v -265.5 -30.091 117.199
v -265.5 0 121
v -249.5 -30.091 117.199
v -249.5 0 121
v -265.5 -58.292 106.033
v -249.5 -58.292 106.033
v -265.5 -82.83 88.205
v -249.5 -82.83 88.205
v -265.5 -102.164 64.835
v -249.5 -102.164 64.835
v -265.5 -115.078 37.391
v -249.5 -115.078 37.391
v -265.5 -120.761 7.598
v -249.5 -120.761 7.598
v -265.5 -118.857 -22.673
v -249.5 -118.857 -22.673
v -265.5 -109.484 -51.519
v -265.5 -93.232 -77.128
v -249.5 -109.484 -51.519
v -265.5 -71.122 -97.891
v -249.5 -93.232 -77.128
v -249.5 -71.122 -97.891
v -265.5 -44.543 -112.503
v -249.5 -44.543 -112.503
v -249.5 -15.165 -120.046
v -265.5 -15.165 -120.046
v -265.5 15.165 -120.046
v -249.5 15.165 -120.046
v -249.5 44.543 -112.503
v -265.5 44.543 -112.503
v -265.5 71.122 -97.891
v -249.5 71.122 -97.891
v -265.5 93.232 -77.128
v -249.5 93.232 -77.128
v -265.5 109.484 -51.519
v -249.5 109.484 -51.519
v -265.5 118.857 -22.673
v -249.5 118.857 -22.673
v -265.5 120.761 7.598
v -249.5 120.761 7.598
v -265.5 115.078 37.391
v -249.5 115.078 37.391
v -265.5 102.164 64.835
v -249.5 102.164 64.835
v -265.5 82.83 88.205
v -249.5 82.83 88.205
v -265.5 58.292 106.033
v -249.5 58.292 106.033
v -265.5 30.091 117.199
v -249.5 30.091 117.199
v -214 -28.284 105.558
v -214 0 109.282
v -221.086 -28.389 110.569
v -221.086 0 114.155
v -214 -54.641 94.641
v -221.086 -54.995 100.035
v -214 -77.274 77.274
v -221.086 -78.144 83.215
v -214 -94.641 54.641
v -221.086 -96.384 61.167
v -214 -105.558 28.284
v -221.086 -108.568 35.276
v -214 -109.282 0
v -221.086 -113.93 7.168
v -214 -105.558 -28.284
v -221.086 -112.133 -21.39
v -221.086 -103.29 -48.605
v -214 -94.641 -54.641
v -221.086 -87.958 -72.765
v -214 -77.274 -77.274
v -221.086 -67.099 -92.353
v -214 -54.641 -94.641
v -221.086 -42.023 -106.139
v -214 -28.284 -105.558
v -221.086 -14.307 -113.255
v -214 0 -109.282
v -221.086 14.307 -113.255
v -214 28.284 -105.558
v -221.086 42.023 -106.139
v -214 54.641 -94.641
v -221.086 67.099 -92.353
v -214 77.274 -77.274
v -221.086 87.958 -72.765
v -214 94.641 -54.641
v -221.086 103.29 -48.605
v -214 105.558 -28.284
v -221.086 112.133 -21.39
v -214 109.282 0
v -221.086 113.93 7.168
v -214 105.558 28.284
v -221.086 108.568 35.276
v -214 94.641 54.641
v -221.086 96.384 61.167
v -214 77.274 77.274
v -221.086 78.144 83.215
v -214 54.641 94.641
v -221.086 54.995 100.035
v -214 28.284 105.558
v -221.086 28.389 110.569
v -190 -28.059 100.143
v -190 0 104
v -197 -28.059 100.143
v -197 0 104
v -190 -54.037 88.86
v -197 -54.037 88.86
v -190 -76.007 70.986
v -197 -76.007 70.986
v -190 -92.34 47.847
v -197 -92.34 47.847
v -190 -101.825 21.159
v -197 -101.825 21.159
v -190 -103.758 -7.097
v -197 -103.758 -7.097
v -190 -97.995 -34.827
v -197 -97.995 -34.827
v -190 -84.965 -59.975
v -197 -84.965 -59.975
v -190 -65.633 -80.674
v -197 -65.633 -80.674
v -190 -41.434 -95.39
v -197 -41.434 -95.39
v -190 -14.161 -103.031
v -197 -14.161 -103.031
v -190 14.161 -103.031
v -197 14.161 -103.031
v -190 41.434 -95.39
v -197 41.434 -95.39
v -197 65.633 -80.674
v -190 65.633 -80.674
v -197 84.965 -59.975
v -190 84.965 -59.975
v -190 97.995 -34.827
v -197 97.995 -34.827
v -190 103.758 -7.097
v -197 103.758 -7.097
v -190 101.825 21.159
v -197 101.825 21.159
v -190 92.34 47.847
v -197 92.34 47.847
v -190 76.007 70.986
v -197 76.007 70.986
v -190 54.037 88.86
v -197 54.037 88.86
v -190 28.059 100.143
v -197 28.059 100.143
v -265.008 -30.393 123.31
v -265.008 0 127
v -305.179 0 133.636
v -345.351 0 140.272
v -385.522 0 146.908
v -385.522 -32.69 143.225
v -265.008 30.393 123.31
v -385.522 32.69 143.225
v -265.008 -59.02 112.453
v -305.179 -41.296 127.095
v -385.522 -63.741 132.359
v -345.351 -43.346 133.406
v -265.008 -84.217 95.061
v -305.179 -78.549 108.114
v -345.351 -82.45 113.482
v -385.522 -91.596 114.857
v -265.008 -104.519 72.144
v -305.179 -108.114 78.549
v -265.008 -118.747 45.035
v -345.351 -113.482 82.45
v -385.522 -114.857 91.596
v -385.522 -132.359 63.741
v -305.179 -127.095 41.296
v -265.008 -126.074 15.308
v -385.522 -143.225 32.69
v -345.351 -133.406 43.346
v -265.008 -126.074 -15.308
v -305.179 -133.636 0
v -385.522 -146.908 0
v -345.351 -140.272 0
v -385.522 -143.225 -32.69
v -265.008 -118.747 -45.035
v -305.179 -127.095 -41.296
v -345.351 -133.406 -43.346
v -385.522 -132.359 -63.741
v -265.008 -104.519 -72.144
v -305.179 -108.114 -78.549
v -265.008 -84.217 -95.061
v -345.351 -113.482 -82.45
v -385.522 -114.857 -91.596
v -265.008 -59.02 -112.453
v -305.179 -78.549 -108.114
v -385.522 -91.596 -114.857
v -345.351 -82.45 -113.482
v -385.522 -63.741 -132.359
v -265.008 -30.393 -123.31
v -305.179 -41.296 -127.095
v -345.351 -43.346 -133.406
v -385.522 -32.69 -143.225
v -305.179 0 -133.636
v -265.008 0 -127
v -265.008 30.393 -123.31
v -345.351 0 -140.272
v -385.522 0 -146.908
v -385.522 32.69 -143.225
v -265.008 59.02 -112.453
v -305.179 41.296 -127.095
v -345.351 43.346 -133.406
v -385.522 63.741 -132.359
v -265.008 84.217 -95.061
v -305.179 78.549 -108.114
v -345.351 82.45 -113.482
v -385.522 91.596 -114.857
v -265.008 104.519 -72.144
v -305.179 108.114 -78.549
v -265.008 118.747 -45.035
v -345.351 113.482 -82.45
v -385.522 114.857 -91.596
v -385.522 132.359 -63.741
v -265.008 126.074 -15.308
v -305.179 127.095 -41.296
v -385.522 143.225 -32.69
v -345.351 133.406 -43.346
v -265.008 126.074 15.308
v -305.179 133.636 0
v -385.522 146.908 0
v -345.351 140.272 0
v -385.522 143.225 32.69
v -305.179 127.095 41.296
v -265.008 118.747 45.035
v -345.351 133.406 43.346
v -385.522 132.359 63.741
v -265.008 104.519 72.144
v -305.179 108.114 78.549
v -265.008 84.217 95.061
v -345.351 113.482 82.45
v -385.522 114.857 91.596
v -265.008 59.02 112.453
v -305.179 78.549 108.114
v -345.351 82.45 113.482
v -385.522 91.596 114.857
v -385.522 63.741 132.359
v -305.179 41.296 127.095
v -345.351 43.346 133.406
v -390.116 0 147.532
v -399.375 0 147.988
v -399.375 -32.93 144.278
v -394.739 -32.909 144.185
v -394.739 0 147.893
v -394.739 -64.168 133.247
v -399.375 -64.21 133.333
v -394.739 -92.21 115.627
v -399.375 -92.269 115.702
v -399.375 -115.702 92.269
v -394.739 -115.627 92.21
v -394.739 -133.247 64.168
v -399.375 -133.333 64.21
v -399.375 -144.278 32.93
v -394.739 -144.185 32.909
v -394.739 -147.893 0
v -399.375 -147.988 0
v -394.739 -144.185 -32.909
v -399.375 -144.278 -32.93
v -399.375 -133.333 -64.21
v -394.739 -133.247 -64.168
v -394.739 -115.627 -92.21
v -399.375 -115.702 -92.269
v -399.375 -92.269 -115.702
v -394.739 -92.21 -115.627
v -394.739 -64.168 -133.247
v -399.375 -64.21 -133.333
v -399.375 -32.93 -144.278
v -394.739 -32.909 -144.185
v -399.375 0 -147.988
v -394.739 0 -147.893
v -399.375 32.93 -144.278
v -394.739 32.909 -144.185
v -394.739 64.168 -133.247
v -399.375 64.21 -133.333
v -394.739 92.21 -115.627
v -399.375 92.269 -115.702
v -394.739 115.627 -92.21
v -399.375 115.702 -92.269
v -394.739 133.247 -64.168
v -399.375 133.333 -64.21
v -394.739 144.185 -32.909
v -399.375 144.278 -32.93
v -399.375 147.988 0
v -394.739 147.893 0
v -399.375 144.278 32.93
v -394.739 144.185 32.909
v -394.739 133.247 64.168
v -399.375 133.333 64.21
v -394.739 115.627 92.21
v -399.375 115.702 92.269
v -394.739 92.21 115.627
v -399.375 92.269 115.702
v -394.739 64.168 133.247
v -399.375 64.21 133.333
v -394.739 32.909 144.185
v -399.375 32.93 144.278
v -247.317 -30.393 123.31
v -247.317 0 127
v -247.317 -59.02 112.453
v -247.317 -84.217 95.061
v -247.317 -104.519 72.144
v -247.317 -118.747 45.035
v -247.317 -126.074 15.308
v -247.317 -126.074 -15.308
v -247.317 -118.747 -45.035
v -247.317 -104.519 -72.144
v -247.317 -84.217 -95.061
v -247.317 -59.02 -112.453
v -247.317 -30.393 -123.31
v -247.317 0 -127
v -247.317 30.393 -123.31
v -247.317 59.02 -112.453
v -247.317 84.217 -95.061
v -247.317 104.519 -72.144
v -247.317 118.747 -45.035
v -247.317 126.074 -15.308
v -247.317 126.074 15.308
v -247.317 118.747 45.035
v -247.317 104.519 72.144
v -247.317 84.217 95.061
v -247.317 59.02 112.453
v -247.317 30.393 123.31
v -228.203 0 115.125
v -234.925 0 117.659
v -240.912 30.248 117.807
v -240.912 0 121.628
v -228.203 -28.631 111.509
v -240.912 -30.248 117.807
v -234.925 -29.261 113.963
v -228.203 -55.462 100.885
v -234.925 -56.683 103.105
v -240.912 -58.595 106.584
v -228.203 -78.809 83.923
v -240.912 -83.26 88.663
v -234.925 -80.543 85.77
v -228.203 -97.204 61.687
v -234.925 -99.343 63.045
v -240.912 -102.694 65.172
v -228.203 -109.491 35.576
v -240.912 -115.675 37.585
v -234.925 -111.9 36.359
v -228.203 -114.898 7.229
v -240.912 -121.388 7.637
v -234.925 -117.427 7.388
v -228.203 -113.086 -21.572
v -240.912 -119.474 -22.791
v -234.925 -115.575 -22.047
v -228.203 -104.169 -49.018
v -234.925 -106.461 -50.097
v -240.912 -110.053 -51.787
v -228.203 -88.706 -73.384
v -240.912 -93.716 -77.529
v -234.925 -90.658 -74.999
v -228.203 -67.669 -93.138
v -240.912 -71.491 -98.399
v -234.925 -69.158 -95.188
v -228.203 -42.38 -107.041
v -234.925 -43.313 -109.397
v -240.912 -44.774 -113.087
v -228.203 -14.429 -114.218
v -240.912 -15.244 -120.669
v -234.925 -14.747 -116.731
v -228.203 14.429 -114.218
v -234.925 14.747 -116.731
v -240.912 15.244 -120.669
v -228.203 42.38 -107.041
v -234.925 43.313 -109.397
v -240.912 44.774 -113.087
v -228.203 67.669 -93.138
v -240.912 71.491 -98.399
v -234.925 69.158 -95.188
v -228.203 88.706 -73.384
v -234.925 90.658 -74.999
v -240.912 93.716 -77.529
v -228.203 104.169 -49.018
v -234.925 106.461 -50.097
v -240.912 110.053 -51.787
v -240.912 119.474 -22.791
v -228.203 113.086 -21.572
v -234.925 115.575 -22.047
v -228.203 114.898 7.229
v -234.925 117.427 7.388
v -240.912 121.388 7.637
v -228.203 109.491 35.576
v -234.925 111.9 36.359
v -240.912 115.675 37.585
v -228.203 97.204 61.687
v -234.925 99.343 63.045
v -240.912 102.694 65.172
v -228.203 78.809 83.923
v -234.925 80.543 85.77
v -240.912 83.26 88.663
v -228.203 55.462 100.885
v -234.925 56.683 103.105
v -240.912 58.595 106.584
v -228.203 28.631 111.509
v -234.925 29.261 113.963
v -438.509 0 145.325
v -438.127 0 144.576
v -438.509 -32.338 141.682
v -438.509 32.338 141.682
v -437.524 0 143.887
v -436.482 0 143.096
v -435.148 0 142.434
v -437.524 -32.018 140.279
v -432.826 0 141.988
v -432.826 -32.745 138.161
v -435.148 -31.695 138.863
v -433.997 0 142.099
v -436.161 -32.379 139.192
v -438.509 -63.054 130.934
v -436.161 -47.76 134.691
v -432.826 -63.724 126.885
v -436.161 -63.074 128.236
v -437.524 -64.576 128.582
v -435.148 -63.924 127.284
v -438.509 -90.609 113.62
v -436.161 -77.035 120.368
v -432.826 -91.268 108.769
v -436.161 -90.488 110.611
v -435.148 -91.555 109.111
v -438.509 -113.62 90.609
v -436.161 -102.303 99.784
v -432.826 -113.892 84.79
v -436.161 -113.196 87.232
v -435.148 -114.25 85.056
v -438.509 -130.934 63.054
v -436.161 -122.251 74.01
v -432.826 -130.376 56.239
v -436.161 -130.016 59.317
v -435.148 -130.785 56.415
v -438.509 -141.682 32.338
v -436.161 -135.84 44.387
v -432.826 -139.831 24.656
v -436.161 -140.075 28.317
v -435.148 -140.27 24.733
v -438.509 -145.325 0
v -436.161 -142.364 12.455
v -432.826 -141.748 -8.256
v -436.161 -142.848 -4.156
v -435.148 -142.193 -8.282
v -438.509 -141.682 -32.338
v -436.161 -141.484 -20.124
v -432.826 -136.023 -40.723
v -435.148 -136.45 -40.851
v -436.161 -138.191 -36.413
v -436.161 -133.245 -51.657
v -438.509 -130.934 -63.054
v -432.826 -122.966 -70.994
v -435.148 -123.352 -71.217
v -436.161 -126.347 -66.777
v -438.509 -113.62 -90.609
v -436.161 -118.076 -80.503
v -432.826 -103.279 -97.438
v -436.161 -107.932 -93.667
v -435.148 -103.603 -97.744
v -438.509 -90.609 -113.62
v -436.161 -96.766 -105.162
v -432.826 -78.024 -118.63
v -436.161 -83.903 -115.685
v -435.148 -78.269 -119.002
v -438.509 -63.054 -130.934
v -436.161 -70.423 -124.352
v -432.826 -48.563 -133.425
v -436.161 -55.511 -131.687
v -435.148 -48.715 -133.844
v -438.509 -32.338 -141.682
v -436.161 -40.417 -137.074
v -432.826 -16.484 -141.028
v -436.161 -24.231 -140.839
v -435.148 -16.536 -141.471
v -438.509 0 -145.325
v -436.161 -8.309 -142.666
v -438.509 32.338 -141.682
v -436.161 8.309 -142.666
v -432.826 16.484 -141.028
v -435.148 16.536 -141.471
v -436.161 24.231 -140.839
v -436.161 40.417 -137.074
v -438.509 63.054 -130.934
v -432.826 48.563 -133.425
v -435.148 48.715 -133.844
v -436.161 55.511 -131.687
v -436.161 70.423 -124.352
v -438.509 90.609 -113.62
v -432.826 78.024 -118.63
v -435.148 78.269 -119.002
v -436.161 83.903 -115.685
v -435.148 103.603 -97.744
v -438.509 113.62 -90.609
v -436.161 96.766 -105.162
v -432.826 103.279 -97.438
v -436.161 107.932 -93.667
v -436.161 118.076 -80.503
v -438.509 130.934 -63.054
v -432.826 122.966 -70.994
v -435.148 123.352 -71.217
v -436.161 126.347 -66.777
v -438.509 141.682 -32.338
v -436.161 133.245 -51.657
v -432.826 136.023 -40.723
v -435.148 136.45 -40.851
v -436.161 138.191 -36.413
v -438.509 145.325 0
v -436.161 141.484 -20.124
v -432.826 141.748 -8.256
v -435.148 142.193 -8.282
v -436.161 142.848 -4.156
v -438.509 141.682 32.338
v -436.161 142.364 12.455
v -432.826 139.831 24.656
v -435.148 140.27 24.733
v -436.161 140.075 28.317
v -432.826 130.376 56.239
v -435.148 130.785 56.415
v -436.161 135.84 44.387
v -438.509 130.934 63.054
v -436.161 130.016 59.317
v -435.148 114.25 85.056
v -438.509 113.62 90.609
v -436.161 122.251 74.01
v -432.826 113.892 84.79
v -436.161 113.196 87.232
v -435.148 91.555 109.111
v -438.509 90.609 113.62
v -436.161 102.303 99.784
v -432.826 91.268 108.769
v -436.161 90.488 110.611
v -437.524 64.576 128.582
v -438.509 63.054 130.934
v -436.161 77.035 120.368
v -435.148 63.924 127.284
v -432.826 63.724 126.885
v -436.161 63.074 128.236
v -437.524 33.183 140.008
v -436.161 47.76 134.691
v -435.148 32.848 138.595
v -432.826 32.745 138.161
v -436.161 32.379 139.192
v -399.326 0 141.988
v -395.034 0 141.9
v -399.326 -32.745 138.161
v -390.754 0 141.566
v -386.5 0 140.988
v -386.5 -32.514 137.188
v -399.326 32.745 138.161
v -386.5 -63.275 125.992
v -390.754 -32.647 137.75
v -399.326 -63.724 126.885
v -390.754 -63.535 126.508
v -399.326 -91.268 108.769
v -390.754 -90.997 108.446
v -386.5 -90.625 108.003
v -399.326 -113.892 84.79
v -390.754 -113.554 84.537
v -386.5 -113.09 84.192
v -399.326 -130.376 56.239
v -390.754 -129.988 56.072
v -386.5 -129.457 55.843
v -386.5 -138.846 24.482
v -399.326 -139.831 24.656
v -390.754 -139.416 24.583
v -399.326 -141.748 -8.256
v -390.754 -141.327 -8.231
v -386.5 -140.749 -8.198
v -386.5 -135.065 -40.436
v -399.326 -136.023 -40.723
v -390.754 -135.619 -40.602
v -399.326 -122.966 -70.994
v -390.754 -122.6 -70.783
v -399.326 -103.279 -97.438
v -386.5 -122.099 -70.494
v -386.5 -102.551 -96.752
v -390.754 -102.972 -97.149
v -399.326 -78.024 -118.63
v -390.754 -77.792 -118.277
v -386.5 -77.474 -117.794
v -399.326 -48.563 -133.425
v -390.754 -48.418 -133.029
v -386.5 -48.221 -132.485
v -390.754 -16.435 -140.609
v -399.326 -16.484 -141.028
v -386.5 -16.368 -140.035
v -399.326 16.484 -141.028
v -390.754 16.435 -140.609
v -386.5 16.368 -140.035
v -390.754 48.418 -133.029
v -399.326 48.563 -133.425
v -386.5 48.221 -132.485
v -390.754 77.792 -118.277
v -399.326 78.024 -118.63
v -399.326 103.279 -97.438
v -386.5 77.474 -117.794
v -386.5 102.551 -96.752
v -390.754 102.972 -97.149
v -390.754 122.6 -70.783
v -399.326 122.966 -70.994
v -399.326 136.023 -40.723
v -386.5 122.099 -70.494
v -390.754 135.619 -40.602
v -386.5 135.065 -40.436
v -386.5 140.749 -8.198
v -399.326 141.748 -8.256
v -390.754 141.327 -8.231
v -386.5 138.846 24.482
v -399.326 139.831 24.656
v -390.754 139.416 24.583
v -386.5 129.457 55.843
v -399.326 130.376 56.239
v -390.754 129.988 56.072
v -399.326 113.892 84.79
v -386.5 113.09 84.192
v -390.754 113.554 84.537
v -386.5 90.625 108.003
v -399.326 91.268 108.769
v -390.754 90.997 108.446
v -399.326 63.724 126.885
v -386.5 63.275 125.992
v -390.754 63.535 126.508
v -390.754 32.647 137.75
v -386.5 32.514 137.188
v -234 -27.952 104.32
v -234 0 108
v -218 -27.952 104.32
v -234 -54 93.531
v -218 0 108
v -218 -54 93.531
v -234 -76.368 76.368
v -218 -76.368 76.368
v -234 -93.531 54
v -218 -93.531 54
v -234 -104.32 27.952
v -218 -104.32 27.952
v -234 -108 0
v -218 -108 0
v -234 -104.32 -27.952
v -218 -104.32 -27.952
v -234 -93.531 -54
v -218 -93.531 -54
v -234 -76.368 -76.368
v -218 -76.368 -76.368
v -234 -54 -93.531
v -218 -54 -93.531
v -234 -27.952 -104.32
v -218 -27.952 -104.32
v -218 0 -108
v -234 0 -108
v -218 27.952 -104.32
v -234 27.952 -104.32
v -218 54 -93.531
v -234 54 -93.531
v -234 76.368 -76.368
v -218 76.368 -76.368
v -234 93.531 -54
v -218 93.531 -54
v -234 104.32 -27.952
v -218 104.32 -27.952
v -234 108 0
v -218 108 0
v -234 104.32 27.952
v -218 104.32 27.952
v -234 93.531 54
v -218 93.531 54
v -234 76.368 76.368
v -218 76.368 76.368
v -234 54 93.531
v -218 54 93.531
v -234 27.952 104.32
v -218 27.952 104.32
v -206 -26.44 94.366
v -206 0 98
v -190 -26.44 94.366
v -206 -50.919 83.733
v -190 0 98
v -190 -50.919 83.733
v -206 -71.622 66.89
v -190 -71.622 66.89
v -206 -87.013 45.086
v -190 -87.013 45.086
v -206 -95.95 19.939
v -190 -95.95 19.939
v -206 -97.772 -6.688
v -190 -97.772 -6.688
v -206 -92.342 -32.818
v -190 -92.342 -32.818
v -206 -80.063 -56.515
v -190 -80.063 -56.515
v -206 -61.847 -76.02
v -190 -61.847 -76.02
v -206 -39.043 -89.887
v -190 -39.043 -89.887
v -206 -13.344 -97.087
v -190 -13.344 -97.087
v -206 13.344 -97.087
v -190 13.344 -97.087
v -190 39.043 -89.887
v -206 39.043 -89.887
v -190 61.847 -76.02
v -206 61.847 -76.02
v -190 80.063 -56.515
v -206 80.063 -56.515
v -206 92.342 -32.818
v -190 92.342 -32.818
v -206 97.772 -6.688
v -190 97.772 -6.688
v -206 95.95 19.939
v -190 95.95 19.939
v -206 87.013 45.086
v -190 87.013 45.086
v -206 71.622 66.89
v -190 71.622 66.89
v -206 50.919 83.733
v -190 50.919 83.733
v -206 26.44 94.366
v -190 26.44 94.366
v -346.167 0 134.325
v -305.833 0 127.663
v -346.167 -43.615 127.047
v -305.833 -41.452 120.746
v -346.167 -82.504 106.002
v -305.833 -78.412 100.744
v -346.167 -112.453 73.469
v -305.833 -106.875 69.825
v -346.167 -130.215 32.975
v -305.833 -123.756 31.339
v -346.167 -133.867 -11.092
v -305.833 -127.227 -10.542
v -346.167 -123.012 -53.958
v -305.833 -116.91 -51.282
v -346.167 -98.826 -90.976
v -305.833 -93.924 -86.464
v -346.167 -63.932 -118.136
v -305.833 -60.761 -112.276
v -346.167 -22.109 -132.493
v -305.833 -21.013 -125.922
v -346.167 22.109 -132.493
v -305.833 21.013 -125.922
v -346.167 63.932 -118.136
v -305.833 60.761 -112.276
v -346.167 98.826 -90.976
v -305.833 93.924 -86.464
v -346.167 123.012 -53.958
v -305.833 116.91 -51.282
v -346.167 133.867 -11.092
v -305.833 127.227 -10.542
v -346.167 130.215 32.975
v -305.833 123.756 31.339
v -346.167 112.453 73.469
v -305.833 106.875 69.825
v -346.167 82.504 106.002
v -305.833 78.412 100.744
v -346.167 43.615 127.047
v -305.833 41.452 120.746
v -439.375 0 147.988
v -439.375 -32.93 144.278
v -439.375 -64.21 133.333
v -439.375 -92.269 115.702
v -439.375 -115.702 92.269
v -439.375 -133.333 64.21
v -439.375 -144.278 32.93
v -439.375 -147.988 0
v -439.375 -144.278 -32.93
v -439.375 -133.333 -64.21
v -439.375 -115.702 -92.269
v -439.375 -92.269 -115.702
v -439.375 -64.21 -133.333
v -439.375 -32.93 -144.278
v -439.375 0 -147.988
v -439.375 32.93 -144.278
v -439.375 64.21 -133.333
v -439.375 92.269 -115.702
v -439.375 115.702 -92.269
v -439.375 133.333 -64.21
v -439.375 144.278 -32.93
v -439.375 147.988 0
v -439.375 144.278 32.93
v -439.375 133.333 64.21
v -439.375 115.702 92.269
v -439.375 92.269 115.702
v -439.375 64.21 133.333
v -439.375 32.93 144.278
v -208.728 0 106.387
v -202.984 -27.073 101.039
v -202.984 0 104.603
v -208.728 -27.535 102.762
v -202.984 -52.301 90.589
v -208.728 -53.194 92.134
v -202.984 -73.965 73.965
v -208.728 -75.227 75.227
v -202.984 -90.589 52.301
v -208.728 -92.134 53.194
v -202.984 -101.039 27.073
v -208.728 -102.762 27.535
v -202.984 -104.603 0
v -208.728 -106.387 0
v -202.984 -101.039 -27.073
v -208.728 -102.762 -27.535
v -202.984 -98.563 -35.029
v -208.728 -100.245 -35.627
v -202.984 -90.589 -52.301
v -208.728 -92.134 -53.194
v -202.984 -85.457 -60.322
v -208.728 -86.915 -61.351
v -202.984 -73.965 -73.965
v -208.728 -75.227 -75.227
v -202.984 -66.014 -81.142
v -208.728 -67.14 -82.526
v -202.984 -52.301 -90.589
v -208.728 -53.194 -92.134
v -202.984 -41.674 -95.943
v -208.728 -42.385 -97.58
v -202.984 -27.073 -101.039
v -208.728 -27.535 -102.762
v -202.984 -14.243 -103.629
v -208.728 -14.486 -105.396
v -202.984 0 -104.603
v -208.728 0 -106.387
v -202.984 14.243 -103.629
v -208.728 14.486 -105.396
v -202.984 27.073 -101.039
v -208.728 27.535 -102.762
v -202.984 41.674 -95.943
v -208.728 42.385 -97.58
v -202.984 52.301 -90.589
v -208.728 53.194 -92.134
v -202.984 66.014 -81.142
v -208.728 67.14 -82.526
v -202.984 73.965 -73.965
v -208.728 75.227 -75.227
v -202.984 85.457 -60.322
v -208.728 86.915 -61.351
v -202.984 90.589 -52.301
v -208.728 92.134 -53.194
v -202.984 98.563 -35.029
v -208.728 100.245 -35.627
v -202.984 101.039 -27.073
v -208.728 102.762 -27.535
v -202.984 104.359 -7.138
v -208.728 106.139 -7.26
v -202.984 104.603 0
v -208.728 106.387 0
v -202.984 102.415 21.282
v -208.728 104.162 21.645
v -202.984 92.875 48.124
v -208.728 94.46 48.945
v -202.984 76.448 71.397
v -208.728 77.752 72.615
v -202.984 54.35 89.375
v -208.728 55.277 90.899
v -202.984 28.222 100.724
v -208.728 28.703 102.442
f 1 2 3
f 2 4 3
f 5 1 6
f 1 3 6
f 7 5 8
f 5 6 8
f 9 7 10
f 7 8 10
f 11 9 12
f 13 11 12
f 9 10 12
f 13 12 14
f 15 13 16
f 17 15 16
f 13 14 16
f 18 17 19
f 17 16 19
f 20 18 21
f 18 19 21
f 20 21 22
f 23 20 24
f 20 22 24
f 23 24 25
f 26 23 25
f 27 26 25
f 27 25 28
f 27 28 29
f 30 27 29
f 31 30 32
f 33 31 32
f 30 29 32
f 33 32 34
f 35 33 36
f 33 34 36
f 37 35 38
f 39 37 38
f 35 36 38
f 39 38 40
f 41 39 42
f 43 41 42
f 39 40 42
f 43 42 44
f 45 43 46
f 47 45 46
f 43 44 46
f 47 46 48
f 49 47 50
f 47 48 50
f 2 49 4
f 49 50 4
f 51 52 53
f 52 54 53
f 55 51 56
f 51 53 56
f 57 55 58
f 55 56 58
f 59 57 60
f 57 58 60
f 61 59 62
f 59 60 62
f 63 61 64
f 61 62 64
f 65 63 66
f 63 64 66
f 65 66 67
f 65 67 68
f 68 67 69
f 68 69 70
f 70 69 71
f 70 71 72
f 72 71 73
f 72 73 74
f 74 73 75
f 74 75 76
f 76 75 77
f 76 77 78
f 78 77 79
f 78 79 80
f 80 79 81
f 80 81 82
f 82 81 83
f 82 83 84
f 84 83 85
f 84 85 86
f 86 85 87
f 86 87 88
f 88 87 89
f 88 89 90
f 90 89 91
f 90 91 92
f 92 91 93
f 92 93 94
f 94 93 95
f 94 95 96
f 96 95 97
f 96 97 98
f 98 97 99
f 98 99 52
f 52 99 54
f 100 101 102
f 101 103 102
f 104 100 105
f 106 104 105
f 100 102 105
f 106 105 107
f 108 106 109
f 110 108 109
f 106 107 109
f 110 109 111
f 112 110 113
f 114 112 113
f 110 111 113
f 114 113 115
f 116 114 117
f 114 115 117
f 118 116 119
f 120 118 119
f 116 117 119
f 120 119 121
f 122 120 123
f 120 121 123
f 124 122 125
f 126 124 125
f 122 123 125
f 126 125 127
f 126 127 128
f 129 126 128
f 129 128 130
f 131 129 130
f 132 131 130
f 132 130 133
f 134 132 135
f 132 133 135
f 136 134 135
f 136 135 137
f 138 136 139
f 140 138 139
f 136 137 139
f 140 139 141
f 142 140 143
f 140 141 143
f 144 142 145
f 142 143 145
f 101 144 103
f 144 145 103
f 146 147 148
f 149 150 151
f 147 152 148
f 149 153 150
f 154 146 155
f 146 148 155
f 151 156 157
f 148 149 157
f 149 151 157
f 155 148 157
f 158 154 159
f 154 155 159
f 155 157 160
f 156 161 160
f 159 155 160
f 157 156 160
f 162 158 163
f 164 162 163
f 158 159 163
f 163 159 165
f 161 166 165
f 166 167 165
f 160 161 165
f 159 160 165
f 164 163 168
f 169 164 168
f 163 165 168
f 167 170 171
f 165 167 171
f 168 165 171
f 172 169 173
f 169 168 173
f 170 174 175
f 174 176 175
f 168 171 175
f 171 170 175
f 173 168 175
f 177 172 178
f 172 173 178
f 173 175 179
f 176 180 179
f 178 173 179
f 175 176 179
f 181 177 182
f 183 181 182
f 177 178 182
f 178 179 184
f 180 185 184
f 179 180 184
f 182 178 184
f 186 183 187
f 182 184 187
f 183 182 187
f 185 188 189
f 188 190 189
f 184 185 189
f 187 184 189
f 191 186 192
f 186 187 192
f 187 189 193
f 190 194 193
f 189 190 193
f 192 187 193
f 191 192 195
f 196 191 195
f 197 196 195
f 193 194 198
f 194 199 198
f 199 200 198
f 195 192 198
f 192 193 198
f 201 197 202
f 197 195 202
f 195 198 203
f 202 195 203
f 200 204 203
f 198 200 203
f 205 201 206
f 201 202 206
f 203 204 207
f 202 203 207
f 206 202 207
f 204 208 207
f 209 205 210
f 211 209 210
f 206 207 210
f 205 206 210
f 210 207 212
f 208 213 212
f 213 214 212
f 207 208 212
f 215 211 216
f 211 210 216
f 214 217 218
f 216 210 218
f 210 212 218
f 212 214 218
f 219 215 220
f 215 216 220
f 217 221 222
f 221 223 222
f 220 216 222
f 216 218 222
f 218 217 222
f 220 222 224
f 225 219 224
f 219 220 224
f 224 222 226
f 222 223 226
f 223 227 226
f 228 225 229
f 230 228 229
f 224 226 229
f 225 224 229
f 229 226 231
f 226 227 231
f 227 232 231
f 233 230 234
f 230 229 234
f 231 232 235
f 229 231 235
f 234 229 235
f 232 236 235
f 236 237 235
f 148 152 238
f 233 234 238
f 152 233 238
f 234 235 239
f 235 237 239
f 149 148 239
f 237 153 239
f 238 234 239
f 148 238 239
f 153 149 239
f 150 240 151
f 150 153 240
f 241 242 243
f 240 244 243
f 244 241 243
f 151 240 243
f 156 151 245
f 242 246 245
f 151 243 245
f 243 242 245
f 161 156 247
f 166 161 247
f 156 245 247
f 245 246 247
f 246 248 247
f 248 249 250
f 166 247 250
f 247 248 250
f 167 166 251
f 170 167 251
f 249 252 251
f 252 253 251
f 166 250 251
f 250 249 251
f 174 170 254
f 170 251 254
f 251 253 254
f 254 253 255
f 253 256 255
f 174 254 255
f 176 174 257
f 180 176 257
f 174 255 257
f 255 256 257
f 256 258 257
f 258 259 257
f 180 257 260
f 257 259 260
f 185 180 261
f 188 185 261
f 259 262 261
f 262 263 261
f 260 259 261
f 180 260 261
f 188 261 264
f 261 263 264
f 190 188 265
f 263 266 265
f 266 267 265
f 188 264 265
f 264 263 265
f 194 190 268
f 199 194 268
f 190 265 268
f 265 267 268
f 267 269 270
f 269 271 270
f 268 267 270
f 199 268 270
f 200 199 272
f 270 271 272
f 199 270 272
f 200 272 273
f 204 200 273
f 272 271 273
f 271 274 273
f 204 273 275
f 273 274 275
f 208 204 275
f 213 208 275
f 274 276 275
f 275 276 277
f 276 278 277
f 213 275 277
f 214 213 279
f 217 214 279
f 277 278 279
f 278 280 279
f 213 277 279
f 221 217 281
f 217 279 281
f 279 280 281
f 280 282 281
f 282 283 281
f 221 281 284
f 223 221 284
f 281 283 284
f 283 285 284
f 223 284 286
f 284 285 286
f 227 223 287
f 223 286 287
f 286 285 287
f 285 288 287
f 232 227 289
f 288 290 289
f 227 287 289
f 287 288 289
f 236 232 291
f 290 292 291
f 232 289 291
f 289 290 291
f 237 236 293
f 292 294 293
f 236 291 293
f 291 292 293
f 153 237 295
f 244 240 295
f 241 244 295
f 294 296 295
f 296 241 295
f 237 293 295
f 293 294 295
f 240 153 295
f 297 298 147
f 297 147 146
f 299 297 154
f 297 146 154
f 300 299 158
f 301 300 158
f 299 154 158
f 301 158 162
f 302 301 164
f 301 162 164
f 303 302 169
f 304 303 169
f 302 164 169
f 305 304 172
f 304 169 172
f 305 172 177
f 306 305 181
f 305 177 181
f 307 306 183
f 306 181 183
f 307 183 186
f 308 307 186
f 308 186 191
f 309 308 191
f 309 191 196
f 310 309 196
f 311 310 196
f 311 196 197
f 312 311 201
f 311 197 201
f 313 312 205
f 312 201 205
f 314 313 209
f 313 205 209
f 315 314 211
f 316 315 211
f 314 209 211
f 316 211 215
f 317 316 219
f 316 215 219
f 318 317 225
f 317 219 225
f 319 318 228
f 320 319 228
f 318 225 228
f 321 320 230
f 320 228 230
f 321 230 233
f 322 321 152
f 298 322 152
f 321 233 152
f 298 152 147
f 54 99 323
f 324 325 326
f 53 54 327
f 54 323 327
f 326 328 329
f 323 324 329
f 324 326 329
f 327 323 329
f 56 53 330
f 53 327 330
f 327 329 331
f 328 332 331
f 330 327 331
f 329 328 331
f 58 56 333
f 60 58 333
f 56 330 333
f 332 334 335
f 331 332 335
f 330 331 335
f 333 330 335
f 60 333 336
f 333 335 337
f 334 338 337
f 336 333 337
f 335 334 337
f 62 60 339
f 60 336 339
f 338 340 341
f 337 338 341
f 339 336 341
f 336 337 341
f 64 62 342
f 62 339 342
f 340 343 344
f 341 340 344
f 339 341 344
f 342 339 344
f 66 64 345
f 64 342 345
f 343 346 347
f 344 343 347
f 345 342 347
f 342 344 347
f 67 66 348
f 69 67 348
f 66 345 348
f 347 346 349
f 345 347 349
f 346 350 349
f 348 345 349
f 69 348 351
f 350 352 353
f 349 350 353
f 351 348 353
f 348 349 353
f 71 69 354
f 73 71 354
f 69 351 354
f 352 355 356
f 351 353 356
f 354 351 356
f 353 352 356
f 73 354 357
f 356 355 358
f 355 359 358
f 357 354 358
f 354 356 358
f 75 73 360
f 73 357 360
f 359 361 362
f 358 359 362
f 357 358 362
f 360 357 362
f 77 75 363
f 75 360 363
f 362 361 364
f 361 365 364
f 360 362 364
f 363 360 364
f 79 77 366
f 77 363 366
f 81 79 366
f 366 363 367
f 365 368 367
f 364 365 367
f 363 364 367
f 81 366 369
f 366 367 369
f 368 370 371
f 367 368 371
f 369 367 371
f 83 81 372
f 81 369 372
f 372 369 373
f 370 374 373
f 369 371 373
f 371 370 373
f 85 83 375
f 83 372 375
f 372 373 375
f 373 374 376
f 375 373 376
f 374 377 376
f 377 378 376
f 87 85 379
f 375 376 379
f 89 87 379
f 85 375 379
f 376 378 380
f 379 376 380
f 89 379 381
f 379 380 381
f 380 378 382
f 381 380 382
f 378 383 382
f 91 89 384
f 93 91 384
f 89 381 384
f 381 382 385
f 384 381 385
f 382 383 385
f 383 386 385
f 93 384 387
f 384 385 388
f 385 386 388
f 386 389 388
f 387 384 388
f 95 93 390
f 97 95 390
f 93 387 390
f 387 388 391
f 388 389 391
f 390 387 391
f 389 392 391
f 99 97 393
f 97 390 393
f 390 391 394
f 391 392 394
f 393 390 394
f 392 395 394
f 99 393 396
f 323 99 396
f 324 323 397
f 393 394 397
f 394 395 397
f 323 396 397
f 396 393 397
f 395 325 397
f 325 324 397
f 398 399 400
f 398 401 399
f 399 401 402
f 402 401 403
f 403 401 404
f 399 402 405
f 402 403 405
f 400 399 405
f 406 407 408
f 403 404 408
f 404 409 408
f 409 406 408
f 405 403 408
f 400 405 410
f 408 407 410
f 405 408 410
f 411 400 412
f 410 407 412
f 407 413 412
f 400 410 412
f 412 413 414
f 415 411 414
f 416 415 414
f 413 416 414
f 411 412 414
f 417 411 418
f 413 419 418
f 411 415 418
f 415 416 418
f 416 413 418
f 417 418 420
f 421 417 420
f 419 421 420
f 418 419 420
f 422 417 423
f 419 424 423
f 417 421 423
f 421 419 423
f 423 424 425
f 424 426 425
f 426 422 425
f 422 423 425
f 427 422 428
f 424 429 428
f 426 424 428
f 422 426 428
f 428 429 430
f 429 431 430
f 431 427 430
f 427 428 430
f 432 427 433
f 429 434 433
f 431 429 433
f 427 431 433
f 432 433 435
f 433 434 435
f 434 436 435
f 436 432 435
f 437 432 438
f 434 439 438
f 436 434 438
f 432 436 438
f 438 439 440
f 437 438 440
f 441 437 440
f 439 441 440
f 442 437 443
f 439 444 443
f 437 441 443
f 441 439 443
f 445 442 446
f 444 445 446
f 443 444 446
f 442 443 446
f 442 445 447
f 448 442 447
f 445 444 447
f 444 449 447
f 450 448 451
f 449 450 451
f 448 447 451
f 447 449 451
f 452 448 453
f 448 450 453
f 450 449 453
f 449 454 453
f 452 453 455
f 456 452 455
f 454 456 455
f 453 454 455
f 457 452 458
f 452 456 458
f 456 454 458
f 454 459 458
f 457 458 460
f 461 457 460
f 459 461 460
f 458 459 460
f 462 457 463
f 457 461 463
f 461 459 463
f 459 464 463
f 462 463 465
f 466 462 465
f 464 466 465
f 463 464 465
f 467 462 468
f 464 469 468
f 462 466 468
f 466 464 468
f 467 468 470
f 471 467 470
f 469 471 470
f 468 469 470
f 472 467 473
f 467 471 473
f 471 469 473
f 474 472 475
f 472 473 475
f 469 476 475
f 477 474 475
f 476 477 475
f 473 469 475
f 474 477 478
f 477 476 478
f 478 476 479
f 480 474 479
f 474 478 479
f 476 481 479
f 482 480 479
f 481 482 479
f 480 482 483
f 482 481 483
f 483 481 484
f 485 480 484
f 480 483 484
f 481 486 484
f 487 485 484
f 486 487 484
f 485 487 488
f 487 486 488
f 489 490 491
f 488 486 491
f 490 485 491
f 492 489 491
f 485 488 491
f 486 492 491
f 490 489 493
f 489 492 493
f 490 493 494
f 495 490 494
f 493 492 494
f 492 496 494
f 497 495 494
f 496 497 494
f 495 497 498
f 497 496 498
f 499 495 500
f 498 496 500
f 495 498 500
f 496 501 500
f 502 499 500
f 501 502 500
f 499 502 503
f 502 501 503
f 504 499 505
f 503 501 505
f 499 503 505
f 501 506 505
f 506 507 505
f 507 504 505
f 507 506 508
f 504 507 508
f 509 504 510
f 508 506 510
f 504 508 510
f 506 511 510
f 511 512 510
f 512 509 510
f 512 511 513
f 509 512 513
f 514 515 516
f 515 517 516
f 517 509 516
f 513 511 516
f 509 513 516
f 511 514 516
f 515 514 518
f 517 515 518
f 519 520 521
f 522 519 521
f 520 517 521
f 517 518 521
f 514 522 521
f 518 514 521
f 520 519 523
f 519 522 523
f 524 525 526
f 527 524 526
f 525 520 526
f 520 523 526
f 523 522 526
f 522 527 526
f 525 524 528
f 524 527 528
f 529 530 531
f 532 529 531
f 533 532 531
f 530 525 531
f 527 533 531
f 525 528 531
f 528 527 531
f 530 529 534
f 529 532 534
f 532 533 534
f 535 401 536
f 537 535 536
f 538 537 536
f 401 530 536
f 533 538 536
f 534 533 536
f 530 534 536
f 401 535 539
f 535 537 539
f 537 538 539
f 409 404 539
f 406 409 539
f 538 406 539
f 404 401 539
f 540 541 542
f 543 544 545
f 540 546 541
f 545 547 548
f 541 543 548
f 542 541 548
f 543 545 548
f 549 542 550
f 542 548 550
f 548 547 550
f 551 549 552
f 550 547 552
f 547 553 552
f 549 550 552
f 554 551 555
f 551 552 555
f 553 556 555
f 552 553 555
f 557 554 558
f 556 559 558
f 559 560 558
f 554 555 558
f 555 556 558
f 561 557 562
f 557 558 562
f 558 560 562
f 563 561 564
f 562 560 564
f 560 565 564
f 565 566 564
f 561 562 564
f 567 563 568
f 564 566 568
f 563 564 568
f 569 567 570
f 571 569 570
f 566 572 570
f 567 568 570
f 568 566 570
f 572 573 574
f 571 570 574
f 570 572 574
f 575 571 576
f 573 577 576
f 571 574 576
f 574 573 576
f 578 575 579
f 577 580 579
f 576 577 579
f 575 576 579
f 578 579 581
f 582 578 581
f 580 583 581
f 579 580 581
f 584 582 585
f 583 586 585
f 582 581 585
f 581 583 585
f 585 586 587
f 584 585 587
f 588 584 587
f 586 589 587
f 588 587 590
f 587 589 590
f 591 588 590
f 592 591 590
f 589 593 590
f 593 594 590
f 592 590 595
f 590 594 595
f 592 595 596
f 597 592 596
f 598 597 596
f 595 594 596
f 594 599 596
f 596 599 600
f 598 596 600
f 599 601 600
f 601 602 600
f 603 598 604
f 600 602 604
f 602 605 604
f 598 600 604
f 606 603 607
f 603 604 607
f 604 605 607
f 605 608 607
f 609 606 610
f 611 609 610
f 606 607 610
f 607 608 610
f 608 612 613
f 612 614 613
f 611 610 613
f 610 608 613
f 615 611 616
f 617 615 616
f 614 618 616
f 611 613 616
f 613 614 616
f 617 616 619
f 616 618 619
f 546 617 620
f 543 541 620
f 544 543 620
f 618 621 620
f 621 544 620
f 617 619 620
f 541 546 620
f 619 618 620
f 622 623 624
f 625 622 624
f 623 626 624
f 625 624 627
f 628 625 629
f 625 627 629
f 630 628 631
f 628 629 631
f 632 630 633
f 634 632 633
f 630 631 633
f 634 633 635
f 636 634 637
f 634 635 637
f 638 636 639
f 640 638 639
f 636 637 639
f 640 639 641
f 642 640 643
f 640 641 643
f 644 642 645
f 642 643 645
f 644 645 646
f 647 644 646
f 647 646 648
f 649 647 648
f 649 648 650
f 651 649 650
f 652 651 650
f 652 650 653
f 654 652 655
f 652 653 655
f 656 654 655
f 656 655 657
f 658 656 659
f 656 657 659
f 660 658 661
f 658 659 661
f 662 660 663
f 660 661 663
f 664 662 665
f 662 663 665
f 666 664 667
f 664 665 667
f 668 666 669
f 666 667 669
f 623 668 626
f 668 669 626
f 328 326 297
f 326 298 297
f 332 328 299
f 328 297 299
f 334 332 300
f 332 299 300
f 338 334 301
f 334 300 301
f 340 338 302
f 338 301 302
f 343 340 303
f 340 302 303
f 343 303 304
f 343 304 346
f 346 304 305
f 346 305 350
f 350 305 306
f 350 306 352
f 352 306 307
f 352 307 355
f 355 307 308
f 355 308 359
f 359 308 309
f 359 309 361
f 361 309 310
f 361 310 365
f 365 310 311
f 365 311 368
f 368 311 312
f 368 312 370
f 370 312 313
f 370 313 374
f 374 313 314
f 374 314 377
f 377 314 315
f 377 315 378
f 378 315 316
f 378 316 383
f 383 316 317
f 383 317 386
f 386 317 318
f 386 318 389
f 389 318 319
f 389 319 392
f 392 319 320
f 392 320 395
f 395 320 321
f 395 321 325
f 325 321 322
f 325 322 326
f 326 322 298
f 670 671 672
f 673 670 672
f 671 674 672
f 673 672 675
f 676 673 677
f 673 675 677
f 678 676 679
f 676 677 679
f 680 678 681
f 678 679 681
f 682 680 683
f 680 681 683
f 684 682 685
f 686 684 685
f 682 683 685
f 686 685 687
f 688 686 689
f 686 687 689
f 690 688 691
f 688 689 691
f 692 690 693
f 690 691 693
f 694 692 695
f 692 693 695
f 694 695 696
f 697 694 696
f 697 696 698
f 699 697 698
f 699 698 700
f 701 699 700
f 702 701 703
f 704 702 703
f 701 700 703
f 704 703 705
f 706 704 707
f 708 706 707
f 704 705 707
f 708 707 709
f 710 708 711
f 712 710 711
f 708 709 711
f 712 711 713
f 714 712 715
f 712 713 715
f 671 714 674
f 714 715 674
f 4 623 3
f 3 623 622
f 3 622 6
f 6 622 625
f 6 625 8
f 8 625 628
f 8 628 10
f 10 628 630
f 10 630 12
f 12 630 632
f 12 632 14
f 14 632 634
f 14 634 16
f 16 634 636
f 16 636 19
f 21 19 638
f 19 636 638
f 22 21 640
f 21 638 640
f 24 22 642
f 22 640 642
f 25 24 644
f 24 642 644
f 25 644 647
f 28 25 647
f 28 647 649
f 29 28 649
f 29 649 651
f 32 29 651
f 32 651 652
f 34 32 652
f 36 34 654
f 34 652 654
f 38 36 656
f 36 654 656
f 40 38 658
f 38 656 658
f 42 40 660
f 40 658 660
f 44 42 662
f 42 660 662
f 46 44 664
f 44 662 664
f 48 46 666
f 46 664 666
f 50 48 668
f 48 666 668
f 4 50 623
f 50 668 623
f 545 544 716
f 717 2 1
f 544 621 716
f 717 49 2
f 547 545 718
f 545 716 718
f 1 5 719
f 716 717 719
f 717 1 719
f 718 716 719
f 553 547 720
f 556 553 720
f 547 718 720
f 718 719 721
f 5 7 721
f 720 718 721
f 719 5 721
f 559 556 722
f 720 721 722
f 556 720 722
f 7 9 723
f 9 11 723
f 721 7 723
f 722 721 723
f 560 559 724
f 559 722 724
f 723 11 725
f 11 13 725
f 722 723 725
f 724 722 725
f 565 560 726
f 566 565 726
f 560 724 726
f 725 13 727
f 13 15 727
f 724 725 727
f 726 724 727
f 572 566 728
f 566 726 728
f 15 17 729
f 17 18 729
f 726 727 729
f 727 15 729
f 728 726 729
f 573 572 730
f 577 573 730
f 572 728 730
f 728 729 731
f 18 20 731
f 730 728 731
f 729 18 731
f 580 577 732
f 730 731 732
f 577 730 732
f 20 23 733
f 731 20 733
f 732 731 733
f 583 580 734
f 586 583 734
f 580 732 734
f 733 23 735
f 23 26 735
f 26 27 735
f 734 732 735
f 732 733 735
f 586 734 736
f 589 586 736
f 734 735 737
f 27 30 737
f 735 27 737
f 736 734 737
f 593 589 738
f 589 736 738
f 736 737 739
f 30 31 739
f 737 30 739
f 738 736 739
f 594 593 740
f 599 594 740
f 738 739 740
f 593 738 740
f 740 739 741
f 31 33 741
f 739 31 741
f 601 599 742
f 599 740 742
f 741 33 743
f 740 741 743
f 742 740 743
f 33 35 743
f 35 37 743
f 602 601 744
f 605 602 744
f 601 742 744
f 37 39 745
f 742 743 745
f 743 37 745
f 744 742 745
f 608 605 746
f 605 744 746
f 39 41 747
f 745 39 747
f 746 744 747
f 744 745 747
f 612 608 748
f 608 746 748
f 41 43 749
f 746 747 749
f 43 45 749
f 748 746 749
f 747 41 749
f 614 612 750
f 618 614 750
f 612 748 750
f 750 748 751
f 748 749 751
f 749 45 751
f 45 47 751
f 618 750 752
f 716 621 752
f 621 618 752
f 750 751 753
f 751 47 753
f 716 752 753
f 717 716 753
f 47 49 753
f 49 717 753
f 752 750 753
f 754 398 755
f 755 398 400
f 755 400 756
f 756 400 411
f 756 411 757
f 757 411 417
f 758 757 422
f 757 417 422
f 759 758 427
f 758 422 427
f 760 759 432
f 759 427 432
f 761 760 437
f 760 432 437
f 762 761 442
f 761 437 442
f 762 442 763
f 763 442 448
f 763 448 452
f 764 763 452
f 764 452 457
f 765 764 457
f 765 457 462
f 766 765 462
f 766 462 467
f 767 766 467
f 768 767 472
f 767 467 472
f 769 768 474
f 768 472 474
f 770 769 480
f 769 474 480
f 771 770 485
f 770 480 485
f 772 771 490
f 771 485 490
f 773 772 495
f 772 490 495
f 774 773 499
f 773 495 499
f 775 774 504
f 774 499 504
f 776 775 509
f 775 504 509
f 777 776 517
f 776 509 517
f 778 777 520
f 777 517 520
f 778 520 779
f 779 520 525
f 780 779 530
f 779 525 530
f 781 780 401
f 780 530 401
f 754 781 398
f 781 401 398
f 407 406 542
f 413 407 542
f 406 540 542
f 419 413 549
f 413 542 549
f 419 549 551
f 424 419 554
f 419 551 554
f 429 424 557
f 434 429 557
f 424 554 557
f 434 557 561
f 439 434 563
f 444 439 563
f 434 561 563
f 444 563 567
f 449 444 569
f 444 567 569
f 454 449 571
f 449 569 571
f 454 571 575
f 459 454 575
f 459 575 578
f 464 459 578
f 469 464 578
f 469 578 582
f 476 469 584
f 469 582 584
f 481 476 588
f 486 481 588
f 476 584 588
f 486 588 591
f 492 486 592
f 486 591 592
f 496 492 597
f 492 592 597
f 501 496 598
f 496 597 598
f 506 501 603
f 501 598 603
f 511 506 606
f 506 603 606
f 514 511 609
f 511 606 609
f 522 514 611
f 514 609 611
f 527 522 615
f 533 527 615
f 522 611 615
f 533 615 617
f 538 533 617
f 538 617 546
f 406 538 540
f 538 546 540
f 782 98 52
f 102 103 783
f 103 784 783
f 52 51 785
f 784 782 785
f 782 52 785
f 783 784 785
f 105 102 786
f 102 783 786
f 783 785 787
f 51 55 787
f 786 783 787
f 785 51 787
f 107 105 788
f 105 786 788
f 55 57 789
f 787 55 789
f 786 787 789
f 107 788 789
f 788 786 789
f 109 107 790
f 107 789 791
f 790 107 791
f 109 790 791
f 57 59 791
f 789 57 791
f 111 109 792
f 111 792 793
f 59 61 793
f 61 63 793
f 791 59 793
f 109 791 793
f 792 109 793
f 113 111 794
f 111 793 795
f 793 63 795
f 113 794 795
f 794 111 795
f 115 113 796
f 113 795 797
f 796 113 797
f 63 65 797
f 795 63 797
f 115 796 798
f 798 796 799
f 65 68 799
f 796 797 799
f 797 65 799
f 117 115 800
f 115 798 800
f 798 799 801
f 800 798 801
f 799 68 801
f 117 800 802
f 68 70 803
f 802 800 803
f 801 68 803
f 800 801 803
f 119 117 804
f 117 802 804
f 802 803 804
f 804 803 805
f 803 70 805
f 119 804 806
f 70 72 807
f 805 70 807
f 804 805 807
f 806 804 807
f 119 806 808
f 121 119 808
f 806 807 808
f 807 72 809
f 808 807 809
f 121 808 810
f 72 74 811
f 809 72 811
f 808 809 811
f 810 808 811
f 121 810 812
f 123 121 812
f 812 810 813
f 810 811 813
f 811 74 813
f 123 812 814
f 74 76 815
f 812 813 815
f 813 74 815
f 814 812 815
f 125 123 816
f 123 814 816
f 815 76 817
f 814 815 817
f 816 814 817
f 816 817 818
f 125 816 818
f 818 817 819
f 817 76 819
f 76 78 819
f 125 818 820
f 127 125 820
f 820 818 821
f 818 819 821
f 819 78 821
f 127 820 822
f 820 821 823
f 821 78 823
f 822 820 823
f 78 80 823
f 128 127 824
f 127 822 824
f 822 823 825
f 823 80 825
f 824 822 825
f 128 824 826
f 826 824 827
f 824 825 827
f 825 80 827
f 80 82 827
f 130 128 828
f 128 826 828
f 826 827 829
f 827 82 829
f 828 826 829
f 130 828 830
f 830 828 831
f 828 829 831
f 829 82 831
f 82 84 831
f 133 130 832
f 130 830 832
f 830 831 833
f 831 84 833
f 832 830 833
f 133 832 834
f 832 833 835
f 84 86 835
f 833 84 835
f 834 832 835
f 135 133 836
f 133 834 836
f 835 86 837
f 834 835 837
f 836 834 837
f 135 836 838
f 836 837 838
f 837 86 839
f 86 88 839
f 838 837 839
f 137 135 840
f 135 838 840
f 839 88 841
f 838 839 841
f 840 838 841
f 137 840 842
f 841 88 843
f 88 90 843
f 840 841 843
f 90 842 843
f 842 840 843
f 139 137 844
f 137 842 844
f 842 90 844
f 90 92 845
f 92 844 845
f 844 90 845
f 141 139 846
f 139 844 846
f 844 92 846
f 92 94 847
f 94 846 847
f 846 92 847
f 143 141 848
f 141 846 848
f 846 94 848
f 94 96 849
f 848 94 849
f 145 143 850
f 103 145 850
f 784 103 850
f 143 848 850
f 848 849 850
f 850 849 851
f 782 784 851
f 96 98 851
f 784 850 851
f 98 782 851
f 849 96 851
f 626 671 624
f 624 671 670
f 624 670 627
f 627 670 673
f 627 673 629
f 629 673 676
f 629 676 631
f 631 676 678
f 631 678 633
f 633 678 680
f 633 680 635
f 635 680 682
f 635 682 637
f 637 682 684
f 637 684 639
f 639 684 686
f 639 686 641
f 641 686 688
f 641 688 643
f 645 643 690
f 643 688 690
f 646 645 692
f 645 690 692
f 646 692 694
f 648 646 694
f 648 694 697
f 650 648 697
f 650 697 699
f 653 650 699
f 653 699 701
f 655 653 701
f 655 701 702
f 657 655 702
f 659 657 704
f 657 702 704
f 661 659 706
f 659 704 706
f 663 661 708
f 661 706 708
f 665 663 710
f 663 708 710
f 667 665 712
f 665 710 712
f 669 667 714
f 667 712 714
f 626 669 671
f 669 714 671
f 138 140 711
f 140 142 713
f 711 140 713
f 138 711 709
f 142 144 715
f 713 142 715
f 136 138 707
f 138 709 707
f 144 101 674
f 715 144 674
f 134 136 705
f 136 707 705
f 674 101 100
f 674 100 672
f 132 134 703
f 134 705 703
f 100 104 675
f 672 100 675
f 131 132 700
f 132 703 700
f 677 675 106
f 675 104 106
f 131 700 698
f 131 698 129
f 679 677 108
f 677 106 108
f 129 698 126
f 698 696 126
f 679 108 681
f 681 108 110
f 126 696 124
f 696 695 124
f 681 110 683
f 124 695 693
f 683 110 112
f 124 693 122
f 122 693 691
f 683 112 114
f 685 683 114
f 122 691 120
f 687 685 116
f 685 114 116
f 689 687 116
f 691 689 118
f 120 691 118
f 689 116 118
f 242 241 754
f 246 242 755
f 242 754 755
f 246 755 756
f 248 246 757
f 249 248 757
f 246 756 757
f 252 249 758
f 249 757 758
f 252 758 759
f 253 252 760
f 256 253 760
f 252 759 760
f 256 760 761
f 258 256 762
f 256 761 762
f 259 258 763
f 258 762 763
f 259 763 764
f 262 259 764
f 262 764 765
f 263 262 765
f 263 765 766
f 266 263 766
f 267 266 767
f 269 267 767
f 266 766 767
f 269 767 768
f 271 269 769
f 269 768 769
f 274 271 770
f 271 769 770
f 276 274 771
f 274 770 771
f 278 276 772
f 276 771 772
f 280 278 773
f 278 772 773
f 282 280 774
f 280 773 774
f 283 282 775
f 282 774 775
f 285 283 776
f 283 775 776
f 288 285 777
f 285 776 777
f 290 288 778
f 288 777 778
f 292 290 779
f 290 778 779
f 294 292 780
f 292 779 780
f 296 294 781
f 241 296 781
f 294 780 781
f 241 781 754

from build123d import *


with BuildPart() as part:
    # Sketch3 → Revolve3 (revolve)
    with BuildSketch(Plane.XY, mode=Mode.PRIVATE) as revolve3_sk:
        with BuildLine():
            Line((-206, -98), (-190, -98))
            Line((-190, -98), (-190, -104))
            Line((-190, -104), (-197, -104))
            ThreePointArc((-197, -104), (-205.900774526, -105.350807815), (-214, -109.281585811))
            Line((-214, -109.281585811), (-221.085945401, -114.154919145))
            ThreePointArc((-221.085945401, -114.154919145), (-231.635573734, -116.203059338), (-240.912230418, -121.628294541))
            Line((-240.912230418, -121.628294541), (-247.316956158, -127))
            Line((-247.316956158, -127), (-265.007764466, -127))
            Line((-265.007764466, -127), (-385.522110558, -146.907802754))
            ThreePointArc((-385.522110558, -146.907802754), (-392.425145491, -147.745592099), (-399.374599409, -147.988228651))
            Line((-399.374599409, -147.988228651), (-439.374599409, -147.988228651))
            Line((-439.374599409, -147.988228651), (-438.509351825, -145.325270406))
            add(Edge.make_bspline(
                [(-438.509351825, -145.325270406), (-438.092908159, -144.043588589), (-435.74371961, -142.389326154), (-433.583616452, -141.988422425), (-432.826378566, -141.988422425)],
                knots=[0, 0, 0, 0, 0.670786836, 1, 1, 1, 1], degree=3))
            Line((-432.826378566, -141.988422425), (-399.326378566, -141.988422425))
            ThreePointArc((-399.326378566, -141.988422425), (-392.891699012, -141.763758951), (-386.5, -140.988028076))
            Line((-386.5, -140.988028076), (-265.5, -121))
            Line((-265.5, -121), (-249.5, -121))
            Line((-249.5, -121), (-234, -108))
            Line((-234, -108), (-218, -108))
            Line((-218, -108), (-206, -98))
        make_face()
    revolve(revolve3_sk.sketch.rotate(Axis((0, 0, 0), (1, 0, 0)), 270), axis=Axis((0, 0, 0), (1, 0, 0)))


solid = part.part
